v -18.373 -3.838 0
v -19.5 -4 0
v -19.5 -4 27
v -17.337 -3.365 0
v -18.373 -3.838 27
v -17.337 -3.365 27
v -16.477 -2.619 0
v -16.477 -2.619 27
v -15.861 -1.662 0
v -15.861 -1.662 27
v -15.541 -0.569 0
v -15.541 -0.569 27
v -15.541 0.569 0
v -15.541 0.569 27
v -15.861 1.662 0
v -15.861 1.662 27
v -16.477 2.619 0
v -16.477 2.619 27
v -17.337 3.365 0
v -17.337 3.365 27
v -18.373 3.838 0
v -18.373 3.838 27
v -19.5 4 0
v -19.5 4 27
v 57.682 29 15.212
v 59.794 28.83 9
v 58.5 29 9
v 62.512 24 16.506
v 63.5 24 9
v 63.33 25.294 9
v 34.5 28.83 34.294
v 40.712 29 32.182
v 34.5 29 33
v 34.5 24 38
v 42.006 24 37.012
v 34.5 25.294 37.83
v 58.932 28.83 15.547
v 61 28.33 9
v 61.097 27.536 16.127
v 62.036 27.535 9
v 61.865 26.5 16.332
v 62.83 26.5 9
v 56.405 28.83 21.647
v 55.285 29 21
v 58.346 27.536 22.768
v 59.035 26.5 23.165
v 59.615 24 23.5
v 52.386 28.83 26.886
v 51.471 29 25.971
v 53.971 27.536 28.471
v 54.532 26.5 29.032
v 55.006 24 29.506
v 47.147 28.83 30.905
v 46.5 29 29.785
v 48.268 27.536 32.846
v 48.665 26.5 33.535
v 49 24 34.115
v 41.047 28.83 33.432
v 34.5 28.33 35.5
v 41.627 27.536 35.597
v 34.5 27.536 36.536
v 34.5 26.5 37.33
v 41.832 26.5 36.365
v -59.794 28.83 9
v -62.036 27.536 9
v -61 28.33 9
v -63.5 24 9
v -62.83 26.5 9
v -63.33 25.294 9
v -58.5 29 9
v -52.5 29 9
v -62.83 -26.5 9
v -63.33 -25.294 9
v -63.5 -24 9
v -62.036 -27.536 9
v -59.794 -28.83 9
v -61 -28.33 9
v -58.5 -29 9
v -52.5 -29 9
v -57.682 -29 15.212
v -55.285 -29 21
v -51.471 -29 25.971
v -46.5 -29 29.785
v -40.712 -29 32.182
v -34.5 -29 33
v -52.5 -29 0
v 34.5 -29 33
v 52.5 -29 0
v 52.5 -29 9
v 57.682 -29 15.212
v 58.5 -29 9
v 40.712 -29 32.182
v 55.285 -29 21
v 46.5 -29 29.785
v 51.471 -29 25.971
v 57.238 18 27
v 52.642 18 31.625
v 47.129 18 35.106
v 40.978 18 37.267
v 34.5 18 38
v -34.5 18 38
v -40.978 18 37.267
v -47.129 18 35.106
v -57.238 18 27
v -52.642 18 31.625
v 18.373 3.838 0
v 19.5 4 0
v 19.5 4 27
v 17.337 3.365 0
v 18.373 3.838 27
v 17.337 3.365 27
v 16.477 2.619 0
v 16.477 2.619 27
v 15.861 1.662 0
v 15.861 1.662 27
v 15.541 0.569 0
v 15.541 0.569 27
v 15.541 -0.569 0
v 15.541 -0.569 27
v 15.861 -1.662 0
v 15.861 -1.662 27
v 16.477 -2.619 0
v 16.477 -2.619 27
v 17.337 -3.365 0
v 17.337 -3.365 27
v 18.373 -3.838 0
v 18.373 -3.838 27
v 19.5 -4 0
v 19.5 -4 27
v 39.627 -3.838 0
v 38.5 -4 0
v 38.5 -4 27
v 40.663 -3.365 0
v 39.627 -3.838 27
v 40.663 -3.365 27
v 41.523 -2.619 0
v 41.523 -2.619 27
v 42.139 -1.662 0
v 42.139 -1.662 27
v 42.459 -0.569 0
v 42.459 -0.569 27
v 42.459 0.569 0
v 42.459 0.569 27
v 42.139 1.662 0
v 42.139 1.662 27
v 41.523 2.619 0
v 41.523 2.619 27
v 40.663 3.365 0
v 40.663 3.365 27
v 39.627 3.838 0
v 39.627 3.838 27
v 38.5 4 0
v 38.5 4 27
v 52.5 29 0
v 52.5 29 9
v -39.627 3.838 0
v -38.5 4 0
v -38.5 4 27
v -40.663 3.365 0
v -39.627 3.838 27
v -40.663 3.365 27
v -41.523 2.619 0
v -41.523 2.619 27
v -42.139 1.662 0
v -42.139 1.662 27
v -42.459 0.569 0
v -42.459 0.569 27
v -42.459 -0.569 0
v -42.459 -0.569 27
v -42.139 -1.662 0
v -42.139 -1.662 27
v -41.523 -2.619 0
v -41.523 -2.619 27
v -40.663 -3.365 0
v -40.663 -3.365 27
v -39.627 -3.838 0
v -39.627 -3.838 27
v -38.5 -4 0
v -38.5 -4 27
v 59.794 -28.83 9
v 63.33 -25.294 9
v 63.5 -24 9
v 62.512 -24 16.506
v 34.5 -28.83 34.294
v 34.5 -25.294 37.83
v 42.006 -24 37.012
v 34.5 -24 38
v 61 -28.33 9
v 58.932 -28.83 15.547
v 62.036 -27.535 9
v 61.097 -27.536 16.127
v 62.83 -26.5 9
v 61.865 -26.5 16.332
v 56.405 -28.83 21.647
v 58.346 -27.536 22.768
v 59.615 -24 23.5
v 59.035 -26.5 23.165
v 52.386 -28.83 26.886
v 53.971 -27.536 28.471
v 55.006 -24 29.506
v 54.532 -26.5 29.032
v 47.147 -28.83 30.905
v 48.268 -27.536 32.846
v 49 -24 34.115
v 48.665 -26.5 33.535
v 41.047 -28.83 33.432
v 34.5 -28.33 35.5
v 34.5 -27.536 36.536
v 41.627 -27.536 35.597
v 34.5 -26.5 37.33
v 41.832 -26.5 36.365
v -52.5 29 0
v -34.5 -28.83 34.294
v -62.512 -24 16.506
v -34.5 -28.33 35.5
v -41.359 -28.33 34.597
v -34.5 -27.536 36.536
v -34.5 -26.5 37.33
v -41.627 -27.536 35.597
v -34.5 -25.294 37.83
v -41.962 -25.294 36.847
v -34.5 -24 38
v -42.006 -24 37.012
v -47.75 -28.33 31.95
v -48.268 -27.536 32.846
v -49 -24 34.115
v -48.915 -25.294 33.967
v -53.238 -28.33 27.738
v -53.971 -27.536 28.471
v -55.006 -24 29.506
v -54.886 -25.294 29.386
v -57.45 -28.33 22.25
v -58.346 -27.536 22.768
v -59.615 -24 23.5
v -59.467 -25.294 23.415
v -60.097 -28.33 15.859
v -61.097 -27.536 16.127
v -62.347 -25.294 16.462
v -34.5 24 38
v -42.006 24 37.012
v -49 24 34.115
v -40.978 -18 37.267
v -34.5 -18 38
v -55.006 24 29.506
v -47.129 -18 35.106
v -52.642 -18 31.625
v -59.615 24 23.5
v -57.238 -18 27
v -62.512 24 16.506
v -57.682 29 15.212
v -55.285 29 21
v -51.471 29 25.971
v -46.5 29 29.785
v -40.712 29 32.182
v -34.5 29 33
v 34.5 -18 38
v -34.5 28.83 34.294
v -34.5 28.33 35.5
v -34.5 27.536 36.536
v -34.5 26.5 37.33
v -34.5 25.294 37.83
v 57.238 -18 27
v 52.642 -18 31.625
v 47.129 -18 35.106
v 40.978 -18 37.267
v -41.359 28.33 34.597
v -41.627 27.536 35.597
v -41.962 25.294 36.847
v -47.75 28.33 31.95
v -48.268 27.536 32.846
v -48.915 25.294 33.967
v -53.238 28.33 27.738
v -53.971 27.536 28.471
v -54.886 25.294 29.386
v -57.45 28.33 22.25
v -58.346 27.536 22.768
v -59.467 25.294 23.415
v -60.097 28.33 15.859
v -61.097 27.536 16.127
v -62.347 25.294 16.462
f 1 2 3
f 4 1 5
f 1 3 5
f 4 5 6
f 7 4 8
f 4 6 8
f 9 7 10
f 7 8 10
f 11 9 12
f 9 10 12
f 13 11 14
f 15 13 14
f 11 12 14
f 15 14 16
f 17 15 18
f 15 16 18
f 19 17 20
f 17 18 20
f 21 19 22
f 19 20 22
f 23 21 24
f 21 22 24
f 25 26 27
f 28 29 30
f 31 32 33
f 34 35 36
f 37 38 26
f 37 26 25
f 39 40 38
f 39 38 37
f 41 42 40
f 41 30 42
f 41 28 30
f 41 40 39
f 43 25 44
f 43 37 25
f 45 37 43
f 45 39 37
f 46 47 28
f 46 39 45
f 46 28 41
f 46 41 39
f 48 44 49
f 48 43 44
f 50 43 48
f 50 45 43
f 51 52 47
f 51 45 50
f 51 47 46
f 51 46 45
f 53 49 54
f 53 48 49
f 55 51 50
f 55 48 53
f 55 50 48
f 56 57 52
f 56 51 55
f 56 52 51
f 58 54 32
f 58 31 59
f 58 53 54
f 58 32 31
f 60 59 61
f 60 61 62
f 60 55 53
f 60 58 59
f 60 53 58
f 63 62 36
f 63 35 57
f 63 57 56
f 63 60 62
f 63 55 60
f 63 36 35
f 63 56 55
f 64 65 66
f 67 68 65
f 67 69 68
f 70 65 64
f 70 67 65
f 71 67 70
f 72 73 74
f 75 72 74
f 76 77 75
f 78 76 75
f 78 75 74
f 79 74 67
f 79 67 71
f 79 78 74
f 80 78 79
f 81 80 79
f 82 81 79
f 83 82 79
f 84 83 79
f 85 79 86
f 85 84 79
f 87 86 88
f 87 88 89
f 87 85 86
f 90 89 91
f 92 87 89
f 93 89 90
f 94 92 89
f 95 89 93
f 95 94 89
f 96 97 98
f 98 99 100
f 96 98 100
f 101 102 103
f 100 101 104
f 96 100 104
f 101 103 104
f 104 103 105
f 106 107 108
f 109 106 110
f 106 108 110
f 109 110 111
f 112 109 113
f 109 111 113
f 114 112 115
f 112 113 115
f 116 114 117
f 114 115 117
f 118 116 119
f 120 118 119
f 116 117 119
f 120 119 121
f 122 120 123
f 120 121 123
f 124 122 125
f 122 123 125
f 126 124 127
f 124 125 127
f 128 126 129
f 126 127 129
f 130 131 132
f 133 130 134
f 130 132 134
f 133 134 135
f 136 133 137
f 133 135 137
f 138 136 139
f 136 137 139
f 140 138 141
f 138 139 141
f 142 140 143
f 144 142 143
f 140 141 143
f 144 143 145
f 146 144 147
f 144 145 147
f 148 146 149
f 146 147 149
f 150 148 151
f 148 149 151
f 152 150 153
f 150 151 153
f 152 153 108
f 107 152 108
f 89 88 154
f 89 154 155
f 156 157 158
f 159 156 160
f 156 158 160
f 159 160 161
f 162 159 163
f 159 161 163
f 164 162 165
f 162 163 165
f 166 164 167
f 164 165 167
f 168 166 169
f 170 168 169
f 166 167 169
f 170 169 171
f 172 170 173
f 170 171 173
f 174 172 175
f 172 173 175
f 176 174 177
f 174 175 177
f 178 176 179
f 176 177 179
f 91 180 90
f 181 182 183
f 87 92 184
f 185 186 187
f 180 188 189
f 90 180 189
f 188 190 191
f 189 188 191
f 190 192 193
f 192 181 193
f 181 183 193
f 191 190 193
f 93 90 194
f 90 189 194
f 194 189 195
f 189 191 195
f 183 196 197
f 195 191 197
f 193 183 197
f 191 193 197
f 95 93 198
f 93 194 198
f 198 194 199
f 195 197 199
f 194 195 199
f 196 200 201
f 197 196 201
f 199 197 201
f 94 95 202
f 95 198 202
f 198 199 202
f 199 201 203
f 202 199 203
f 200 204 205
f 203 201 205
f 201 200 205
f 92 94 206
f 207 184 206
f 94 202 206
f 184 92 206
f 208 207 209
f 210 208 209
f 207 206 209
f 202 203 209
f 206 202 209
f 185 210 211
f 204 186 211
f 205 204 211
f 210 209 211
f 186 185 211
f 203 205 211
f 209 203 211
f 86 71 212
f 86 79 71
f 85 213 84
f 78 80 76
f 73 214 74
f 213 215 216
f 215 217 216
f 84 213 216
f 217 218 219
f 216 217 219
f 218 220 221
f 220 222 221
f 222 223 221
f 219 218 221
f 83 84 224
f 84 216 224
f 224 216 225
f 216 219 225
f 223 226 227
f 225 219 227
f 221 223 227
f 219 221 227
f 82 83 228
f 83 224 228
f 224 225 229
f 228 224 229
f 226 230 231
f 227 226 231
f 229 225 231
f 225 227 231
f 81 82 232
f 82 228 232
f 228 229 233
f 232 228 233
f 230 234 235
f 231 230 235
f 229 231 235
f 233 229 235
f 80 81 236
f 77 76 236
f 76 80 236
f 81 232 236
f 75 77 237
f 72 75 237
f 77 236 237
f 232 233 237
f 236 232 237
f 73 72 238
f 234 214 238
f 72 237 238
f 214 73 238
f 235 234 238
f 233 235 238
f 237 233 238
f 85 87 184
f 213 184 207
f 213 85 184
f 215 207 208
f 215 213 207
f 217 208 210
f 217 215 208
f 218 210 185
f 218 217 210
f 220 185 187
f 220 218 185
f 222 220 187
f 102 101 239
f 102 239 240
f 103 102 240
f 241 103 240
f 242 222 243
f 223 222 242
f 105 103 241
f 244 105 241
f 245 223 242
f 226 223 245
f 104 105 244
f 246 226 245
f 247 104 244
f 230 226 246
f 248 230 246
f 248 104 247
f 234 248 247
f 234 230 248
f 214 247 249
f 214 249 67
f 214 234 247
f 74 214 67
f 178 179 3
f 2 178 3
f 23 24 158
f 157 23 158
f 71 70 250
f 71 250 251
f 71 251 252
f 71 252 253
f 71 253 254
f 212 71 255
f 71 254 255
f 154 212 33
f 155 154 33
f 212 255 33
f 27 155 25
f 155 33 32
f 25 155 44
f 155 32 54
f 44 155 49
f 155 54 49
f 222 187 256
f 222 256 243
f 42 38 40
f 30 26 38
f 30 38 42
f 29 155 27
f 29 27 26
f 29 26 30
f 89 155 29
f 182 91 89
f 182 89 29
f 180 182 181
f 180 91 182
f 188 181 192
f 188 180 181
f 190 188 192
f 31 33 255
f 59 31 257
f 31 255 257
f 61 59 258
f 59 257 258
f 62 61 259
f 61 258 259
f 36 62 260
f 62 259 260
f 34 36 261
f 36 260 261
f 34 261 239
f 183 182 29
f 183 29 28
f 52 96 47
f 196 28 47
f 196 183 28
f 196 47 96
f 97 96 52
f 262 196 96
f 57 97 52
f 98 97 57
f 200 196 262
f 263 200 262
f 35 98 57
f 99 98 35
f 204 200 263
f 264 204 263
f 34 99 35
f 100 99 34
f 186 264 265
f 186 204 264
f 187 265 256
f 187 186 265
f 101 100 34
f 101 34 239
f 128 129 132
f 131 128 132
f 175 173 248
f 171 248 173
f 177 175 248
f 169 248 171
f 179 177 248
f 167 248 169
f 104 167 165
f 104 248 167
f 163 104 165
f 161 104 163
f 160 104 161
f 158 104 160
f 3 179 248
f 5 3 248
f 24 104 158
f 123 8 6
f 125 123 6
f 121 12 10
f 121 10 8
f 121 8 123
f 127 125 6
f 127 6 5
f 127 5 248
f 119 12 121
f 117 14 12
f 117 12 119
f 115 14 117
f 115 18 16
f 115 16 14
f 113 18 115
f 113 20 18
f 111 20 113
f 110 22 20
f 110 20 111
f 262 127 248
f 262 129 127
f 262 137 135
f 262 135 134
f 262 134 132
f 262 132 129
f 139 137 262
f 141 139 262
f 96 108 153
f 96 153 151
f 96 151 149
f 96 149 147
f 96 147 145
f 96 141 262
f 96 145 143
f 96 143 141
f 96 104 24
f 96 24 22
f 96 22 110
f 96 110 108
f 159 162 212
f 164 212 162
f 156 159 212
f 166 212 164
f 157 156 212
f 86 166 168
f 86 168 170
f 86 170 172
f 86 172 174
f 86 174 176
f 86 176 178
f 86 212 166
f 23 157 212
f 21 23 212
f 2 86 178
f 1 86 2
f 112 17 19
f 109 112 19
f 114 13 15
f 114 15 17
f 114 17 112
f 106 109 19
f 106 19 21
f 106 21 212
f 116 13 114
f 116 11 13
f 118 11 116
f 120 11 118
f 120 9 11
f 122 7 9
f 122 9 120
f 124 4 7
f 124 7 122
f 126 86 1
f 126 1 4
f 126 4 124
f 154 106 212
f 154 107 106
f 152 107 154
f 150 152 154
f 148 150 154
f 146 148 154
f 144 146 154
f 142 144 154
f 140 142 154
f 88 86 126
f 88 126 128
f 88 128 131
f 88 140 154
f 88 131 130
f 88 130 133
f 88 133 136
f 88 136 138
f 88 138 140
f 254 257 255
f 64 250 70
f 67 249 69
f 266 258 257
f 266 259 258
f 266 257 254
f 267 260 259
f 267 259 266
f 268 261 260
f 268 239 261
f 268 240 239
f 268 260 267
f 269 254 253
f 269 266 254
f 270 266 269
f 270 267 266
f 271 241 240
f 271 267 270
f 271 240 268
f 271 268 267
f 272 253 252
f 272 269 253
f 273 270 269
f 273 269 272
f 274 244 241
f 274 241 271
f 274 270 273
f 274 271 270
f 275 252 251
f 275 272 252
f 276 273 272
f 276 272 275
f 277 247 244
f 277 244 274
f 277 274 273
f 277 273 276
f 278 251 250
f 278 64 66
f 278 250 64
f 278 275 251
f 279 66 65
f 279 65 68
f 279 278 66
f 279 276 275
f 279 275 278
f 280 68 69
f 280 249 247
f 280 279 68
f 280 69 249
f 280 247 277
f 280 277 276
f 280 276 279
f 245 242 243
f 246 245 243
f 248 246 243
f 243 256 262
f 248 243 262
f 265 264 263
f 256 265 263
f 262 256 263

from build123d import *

# Parameters (mm, degrees)
F1_DEPTH = 29
F3_DEPTH = 38.001
F4_DEPTH = 11
F5_R     = 5


with BuildPart() as f1:
    # F0 (on Front) → F1 (new body, symmetric)
    with BuildSketch(Plane.XZ):
        with BuildLine():
            Line((-52.5, 0), (0, 0))
            Line((0, 0), (52.5, 0))
            Line((52.5, 0), (52.5, 9))
            Line((52.5, 9), (63.5, 9))
            ThreePointArc((63.5, 9), (55.006097, 29.506097), (34.5, 38))
            Line((34.5, 38), (0, 38))
            Line((0, 38), (-34.5, 38))
            ThreePointArc((-34.5, 38), (-55.006097, 29.506097), (-63.5, 9))
            Line((-63.5, 9), (-52.5, 9))
            Line((-52.5, 9), (-52.5, 0))
        make_face()
    extrude(amount=F1_DEPTH, both=True)

    # F2 (on face) → F3 (cut, through all)
    with BuildSketch(Plane.XY.offset(38)):
        with BuildLine():
            Line((-19.5, 4), (-34.5, 4))
            Line((-34.5, 4), (-34.5, -4))
            Line((-34.5, -4), (-19.5, -4))
            ThreePointArc((-19.5, -4), (-15.5, 0), (-19.5, 4))
        make_face()
        with BuildLine():
            Line((-34.5, -4), (-34.5, 4))
            Line((-34.5, 4), (-38.5, 4))
            ThreePointArc((-38.5, 4), (-42.5, 0), (-38.5, -4))
            Line((-38.5, -4), (-34.5, -4))
        make_face()
        with BuildLine():
            Line((34.5, -4), (34.5, 4))
            Line((34.5, 4), (19.5, 4))
            ThreePointArc((19.5, 4), (15.5, 0), (19.5, -4))
            Line((19.5, -4), (34.5, -4))
        make_face()
        with BuildLine():
            Line((38.5, 4), (34.5, 4))
            Line((34.5, 4), (34.5, -4))
            Line((34.5, -4), (38.5, -4))
            ThreePointArc((38.5, -4), (42.5, 0), (38.5, 4))
        make_face()
    extrude(amount=-F3_DEPTH, mode=Mode.SUBTRACT)

    # F2 (on face) → F4 (cut)
    with BuildSketch(Plane.XY.offset(38)):
        with BuildLine():
            Line((-34.5, 4), (-34.5, 18))
            Line((-34.5, 18), (-67.5, 18))
            Line((-67.5, 18), (-67.5, -18))
            Line((-67.5, -18), (-34.5, -18))
            Line((-34.5, -18), (-34.5, -4))
            Line((-34.5, -4), (-38.5, -4))
            ThreePointArc((-38.5, -4), (-42.5, 0), (-38.5, 4))
            Line((-38.5, 4), (-34.5, 4))
        make_face()
        with BuildLine():
            Line((34.5, 18), (-34.5, 18))
            Line((-34.5, 18), (-34.5, 4))
            Line((-34.5, 4), (-19.5, 4))
            ThreePointArc((-19.5, 4), (-15.5, 0), (-19.5, -4))
            Line((-19.5, -4), (-34.5, -4))
            Line((-34.5, -4), (-34.5, -18))
            Line((-34.5, -18), (34.5, -18))
            Line((34.5, -18), (34.5, -4))
            Line((34.5, -4), (19.5, -4))
            ThreePointArc((19.5, -4), (15.5, 0), (19.5, 4))
            Line((19.5, 4), (34.5, 4))
            Line((34.5, 4), (34.5, 18))
        make_face()
        with BuildLine():
            Line((74.5, 18), (34.5, 18))
            Line((34.5, 18), (34.5, 4))
            Line((34.5, 4), (38.5, 4))
            ThreePointArc((38.5, 4), (42.5, 0), (38.5, -4))
            Line((38.5, -4), (34.5, -4))
            Line((34.5, -4), (34.5, -18))
            Line((34.5, -18), (74.5, -18))
            Line((74.5, -18), (74.5, 18))
        make_face()
    extrude(amount=-F4_DEPTH, mode=Mode.SUBTRACT)

    # F5
    f5_edges = [f1.edges().sort_by_distance(p)[0] for p in [
        (0, -29, 38),
        (0, 29, 38),
    ]]
    fillet(f5_edges, radius=F5_R)


solid = f1.part
